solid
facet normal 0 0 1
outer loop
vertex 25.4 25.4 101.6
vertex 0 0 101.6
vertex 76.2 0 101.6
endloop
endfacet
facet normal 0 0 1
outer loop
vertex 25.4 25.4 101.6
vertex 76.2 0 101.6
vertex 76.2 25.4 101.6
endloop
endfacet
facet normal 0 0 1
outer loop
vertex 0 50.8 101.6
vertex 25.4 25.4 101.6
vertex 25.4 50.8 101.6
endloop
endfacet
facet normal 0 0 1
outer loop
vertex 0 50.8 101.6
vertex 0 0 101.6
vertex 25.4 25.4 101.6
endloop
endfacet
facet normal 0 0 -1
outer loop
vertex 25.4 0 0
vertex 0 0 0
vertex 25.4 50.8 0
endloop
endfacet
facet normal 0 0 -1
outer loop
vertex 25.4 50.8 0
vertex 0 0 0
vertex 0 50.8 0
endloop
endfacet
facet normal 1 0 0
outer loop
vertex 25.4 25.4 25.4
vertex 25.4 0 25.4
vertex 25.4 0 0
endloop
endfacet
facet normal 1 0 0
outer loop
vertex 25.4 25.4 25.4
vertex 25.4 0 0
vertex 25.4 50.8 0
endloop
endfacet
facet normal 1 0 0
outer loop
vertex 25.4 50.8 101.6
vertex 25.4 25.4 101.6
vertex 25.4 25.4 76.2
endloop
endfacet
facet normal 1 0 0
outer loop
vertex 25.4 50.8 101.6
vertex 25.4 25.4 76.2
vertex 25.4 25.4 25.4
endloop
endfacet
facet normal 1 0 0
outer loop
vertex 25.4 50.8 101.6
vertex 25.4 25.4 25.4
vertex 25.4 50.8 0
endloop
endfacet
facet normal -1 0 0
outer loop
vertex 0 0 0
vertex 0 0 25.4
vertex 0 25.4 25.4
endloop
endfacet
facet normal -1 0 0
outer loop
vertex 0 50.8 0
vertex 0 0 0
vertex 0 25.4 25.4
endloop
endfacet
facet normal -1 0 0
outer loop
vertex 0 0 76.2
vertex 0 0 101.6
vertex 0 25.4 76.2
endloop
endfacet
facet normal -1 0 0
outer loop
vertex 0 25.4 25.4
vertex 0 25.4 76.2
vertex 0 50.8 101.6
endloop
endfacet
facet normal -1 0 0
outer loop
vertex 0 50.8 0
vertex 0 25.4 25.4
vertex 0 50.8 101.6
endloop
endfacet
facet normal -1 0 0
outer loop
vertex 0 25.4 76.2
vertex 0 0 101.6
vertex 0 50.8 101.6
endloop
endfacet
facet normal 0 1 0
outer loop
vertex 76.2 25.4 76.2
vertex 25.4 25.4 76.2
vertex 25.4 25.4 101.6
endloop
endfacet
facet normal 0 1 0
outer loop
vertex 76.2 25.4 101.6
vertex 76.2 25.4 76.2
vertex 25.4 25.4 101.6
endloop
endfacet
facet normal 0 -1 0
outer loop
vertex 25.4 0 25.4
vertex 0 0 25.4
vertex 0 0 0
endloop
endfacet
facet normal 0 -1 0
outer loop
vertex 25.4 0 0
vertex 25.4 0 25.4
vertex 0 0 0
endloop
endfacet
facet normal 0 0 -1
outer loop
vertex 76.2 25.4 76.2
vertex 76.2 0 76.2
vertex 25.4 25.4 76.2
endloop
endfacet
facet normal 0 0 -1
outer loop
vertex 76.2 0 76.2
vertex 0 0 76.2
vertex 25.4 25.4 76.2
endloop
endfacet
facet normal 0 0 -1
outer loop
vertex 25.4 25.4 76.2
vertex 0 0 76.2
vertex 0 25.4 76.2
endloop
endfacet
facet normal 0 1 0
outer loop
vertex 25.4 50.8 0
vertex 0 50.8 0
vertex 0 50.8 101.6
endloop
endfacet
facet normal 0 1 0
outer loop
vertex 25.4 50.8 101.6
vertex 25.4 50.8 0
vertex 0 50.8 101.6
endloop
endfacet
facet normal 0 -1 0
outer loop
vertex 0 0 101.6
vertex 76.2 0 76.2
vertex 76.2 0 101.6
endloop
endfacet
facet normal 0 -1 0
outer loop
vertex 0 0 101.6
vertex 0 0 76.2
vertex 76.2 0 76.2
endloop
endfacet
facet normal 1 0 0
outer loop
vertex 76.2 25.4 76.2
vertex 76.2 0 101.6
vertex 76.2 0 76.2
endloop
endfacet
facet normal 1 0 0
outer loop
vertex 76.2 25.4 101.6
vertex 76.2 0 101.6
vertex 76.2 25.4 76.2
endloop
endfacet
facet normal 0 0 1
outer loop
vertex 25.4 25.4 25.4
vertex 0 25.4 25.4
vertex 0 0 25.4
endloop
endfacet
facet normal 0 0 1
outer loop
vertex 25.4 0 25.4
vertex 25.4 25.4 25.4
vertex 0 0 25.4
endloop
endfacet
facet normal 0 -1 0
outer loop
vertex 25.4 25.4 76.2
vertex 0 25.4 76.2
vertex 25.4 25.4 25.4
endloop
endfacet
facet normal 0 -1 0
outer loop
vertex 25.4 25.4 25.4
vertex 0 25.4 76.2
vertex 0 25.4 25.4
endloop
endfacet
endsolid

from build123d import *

# Parameters (mm, degrees)
F1_DEPTH = 25.4
F2_W     = 25.4
F2_H     = 25.4
F3_DEPTH = 50.8


with BuildPart() as f1:
    # F0 (on Right) → F1 (new body)
    with BuildSketch(Plane.YZ):
        Polygon((50.8, 101.6), (0, 101.6), (0, 76.2), (25.4, 76.2), (25.4, 25.4), (0, 25.4), (0, 0), (50.8, 0), align=None)
    extrude(amount=F1_DEPTH)

    # F2 (on face) → F3 (join)
    with BuildSketch(Plane.YZ.offset(25.4)):
        with Locations((12.7, 88.9)):
            Rectangle(F2_W, F2_H)
    extrude(amount=F3_DEPTH)


solid = f1.part
